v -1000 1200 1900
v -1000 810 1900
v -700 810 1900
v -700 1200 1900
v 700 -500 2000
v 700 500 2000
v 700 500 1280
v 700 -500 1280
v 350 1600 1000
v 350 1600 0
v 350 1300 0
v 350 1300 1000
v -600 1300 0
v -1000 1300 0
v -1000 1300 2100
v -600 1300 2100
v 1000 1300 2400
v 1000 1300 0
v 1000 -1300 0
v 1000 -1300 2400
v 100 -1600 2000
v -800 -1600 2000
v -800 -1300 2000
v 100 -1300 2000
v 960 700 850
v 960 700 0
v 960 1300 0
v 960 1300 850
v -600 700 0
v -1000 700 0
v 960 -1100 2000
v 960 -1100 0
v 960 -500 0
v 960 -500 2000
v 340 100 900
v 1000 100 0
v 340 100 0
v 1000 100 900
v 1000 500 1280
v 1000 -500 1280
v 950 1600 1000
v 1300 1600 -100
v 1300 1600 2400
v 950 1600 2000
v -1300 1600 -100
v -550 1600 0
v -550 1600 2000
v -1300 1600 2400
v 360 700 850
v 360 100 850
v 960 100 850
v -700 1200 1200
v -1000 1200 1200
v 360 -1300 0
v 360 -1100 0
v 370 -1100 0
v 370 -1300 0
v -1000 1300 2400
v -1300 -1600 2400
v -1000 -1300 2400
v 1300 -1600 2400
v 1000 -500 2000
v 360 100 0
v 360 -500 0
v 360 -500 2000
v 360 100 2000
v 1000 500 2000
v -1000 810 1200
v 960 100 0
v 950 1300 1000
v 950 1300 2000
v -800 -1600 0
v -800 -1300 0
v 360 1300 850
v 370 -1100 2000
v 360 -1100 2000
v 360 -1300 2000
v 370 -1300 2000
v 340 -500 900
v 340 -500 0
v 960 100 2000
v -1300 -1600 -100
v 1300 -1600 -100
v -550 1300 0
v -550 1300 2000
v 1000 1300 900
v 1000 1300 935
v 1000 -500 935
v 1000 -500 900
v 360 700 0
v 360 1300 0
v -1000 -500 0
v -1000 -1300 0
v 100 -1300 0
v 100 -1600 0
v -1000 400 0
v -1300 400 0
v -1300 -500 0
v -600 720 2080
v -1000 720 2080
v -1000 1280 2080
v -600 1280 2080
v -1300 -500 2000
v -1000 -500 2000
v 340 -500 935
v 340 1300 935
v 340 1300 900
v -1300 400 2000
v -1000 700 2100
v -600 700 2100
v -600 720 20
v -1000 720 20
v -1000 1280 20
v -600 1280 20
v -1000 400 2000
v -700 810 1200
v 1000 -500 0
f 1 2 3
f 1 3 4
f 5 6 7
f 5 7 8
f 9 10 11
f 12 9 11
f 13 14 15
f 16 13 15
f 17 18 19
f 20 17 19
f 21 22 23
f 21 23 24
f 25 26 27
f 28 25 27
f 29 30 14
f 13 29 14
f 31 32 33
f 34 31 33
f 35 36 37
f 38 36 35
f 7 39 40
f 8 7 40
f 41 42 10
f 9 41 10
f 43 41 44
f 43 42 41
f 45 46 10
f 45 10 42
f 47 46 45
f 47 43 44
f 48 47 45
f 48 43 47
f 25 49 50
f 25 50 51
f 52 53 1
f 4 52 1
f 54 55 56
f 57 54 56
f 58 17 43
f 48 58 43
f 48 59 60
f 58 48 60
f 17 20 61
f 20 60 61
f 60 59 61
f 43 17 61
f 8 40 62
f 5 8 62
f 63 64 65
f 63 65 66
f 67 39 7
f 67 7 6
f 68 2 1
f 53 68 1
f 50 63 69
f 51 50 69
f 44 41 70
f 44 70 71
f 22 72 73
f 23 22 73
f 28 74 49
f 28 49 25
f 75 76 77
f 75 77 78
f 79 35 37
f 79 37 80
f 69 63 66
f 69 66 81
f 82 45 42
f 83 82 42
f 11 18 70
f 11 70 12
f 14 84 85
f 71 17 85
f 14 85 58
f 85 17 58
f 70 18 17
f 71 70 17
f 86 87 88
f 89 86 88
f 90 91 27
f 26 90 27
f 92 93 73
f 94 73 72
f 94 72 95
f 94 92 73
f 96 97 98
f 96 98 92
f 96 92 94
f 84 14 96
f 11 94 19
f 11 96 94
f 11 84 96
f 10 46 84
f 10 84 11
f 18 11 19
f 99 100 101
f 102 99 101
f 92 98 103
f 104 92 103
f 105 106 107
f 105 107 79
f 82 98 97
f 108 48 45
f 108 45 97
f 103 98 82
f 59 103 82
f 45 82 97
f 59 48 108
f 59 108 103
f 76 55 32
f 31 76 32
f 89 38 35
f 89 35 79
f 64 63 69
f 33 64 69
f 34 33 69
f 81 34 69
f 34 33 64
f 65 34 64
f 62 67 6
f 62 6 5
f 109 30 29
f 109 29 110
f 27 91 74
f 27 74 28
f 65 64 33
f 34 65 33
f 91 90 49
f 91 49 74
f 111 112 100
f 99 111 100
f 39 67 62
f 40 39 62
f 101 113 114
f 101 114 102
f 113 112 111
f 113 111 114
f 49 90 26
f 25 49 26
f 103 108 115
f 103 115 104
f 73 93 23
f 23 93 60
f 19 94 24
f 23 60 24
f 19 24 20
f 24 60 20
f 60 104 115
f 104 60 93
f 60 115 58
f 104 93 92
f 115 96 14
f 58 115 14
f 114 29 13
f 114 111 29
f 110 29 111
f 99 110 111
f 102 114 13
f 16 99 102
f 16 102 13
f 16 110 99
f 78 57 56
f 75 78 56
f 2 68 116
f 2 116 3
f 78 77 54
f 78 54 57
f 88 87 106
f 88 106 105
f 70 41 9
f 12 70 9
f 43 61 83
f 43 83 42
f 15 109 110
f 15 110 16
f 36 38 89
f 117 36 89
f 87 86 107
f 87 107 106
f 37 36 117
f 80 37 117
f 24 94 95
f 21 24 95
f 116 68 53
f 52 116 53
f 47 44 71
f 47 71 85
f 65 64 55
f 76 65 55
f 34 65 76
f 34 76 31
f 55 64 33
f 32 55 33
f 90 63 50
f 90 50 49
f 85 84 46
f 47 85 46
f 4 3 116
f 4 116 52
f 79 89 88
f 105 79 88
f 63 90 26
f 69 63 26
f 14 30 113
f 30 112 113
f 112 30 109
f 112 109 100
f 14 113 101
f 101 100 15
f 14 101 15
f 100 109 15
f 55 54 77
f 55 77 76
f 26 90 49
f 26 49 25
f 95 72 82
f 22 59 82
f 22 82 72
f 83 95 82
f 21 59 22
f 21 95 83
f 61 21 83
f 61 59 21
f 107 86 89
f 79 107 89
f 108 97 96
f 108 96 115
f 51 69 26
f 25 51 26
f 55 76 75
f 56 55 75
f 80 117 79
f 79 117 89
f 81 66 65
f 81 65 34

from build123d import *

# Parameters (mm, degrees)
F1_DEPTH  = 2400
F2_DEPTH  = 100
F3_W      = 600
F3_H      = 600
F4_DEPTH  = 850
F5_DEPTH  = 850
F6_DEPTH  = 2000
F7_DEPTH  = 2000
F3_W_2    = 10
F3_H_2    = 200
F8_DEPTH  = 2000
F9_W      = 600
F9_H      = 1000
F10_DEPTH = 300
F9_W_2    = 900
F9_H_2    = 400
F11_DEPTH = 300
F12_W     = 900
F12_H     = 400
F13_DEPTH = 300
F14_W     = 900
F14_H     = 2000
F15_DEPTH = 300
F16_W     = 1000
F16_H     = 720
F17_DEPTH = 300
F18_W     = 390
F18_H     = 700
F19_DEPTH = 300
F20_W     = 600
F20_H     = 2100
F20_W_2   = 560
F20_H_2   = 2060
F21_DEPTH = 400
F22_W     = 600
F22_H     = 900
F23_DEPTH = 660
F24_W     = 1800
F24_H     = 35
F25_DEPTH = 660


# Not quite as in the source:
# - a feature names something its author has since deleted; it is built from what else it names


with BuildPart() as f1:
    # F0 (on Top) → F1 (new body)
    with BuildSketch(Plane.XY):
        Polygon((1300, 1600), (350, 1600), (350, 1300), (1000, 1300), (1000, -1300), (100, -1300), (100, -1600), (1300, -1600), align=None)
    extrude(amount=F1_DEPTH)



with BuildPart() as f1b:
    # F0 (on Top) → F1, piece 2 (new body)
    with BuildSketch(Plane.XY):
        Polygon((-1000, -1300), (-1000, 1300), (-550, 1300), (-550, 1600), (-1300, 1600), (-1300, -1600), (-800, -1600), (-800, -1300), align=None)
    extrude(amount=F1_DEPTH)


with BuildPart() as f1_1:
    add(f1.part)

    add(f1b.part)  # F2 merges F1b
    # F0 (on Top) → F2 (join)
    with BuildSketch(Plane.XY):
        Polygon((-550, 1300), (-1000, 1300), (-1000, -1300), (-800, -1300), (-800, -1600), (100, -1600), (100, -1300), (1000, -1300), (1000, 1300), (350, 1300), (350, 1600), (-550, 1600), align=None)
        Polygon((-1000, -1300), (-1000, 1300), (-550, 1300), (-550, 1600), (-1300, 1600), (-1300, -1600), (-800, -1600), (-800, -1300), align=None)
        Polygon((1300, 1600), (350, 1600), (350, 1300), (1000, 1300), (1000, -1300), (100, -1300), (100, -1600), (1300, -1600), align=None)
    extrude(amount=-F2_DEPTH)

    # F9 (on face) → F10 (cut, through all)
    with BuildSketch(Plane(origin=(0, 1600, 0), x_dir=(-1, 0, 0), z_dir=(0, 1, 0))):
        with Locations((-650, 1500)):
            Rectangle(F9_W, F9_H)
    extrude(amount=-F10_DEPTH, mode=Mode.SUBTRACT)

    # F9 (on face) → F11 (join, through all)
    with BuildSketch(Plane(origin=(0, 1600, 0), x_dir=(-1, 0, 0), z_dir=(0, 1, 0))):
        with Locations((100, 2200)):
            Rectangle(F9_W_2, F9_H_2)
    extrude(amount=-F11_DEPTH)

    # F12 (on face) → F13 (join, through all)
    with BuildSketch(Plane.XZ.offset(1600)):
        with Locations((-350, 2200)):
            Rectangle(F12_W, F12_H)
    extrude(amount=-F13_DEPTH)

    # F14 (on face) → F15 (cut, through all)
    with BuildSketch(Plane(origin=(-1300, 0, 0), x_dir=(0, -1, 0), z_dir=(-1, 0, 0))):
        with Locations((50, 1000)):
            Rectangle(F14_W, F14_H)
    extrude(amount=-F15_DEPTH, mode=Mode.SUBTRACT)


with BuildPart() as f4:
    # F3 (on face) → F4 (new body)
    with BuildSketch(Plane.XY):
        with Locations((660, 1000)):
            Rectangle(F3_W, F3_H)
    extrude(amount=F4_DEPTH)


with BuildPart() as f5:
    # F3 (on face) → F5 (new body)
    with BuildSketch(Plane.XY):
        with Locations((660, 400)):
            Rectangle(F3_W, F3_H)
    extrude(amount=F5_DEPTH)


with BuildPart() as f6:
    # F3 (on face) → F6 (new body)
    with BuildSketch(Plane.XY):
        with Locations((660, -200)):
            Rectangle(F3_W, F3_H)
    extrude(amount=F6_DEPTH)


with BuildPart() as f7:
    # F3 (on face) → F7 (new body)
    with BuildSketch(Plane.XY):
        Polygon((960, -1100), (960, -500), (360, -500), (360, -1100), (370, -1100), align=None)
    extrude(amount=F7_DEPTH)


with BuildPart() as f8:
    # F3 (on face) → F8 (new body)
    with BuildSketch(Plane.XY):
        with Locations((365, -1200)):
            Rectangle(F3_W_2, F3_H_2)
    extrude(amount=F8_DEPTH)


with BuildPart() as f17:
    # F16 (on face) → F17 (new body)
    with BuildSketch(Plane(origin=(1000, 0, 0), x_dir=(0, -1, 0), z_dir=(-1, 0, 0))):
        with Locations((0, 1640)):
            Rectangle(F16_W, F16_H)
    extrude(amount=F17_DEPTH)


with BuildPart() as f19:
    # F18 (on face) → F19 (new body)
    with BuildSketch(Plane.YZ.offset(-1000)):
        with Locations((1005, 1550)):
            Rectangle(F18_W, F18_H)
    extrude(amount=F19_DEPTH)


with BuildPart() as f21:
    # F20 (on face) → F21 (new body)
    with BuildSketch(Plane.YZ.offset(-1000)):
        with Locations((1000, 1050)):
            Rectangle(F20_W, F20_H)
        with Locations((1000, 1050)):
            Rectangle(F20_W_2, F20_H_2, mode=Mode.SUBTRACT)
    extrude(amount=F21_DEPTH)


with BuildPart() as f23:
    # F22 (on face) → F23 (new body)
    with BuildSketch(Plane(origin=(1000, 0, 0), x_dir=(0, -1, 0), z_dir=(-1, 0, 0))):
        with Locations((200, 450)):
            Rectangle(F22_W, F22_H)
    extrude(amount=F23_DEPTH)


with BuildPart() as f25:
    # F24 (on face) → F25 (new body, through all)
    with BuildSketch(Plane(origin=(1000, 0, 0), x_dir=(0, -1, 0), z_dir=(-1, 0, 0))):
        with Locations((-400, 917.5)):
            Rectangle(F24_W, F24_H)
    extrude(amount=F25_DEPTH)


solid = Compound([f1_1.part, f4.part, f5.part, f6.part, f7.part, f8.part, f17.part, f19.part, f21.part, f23.part, f25.part])
